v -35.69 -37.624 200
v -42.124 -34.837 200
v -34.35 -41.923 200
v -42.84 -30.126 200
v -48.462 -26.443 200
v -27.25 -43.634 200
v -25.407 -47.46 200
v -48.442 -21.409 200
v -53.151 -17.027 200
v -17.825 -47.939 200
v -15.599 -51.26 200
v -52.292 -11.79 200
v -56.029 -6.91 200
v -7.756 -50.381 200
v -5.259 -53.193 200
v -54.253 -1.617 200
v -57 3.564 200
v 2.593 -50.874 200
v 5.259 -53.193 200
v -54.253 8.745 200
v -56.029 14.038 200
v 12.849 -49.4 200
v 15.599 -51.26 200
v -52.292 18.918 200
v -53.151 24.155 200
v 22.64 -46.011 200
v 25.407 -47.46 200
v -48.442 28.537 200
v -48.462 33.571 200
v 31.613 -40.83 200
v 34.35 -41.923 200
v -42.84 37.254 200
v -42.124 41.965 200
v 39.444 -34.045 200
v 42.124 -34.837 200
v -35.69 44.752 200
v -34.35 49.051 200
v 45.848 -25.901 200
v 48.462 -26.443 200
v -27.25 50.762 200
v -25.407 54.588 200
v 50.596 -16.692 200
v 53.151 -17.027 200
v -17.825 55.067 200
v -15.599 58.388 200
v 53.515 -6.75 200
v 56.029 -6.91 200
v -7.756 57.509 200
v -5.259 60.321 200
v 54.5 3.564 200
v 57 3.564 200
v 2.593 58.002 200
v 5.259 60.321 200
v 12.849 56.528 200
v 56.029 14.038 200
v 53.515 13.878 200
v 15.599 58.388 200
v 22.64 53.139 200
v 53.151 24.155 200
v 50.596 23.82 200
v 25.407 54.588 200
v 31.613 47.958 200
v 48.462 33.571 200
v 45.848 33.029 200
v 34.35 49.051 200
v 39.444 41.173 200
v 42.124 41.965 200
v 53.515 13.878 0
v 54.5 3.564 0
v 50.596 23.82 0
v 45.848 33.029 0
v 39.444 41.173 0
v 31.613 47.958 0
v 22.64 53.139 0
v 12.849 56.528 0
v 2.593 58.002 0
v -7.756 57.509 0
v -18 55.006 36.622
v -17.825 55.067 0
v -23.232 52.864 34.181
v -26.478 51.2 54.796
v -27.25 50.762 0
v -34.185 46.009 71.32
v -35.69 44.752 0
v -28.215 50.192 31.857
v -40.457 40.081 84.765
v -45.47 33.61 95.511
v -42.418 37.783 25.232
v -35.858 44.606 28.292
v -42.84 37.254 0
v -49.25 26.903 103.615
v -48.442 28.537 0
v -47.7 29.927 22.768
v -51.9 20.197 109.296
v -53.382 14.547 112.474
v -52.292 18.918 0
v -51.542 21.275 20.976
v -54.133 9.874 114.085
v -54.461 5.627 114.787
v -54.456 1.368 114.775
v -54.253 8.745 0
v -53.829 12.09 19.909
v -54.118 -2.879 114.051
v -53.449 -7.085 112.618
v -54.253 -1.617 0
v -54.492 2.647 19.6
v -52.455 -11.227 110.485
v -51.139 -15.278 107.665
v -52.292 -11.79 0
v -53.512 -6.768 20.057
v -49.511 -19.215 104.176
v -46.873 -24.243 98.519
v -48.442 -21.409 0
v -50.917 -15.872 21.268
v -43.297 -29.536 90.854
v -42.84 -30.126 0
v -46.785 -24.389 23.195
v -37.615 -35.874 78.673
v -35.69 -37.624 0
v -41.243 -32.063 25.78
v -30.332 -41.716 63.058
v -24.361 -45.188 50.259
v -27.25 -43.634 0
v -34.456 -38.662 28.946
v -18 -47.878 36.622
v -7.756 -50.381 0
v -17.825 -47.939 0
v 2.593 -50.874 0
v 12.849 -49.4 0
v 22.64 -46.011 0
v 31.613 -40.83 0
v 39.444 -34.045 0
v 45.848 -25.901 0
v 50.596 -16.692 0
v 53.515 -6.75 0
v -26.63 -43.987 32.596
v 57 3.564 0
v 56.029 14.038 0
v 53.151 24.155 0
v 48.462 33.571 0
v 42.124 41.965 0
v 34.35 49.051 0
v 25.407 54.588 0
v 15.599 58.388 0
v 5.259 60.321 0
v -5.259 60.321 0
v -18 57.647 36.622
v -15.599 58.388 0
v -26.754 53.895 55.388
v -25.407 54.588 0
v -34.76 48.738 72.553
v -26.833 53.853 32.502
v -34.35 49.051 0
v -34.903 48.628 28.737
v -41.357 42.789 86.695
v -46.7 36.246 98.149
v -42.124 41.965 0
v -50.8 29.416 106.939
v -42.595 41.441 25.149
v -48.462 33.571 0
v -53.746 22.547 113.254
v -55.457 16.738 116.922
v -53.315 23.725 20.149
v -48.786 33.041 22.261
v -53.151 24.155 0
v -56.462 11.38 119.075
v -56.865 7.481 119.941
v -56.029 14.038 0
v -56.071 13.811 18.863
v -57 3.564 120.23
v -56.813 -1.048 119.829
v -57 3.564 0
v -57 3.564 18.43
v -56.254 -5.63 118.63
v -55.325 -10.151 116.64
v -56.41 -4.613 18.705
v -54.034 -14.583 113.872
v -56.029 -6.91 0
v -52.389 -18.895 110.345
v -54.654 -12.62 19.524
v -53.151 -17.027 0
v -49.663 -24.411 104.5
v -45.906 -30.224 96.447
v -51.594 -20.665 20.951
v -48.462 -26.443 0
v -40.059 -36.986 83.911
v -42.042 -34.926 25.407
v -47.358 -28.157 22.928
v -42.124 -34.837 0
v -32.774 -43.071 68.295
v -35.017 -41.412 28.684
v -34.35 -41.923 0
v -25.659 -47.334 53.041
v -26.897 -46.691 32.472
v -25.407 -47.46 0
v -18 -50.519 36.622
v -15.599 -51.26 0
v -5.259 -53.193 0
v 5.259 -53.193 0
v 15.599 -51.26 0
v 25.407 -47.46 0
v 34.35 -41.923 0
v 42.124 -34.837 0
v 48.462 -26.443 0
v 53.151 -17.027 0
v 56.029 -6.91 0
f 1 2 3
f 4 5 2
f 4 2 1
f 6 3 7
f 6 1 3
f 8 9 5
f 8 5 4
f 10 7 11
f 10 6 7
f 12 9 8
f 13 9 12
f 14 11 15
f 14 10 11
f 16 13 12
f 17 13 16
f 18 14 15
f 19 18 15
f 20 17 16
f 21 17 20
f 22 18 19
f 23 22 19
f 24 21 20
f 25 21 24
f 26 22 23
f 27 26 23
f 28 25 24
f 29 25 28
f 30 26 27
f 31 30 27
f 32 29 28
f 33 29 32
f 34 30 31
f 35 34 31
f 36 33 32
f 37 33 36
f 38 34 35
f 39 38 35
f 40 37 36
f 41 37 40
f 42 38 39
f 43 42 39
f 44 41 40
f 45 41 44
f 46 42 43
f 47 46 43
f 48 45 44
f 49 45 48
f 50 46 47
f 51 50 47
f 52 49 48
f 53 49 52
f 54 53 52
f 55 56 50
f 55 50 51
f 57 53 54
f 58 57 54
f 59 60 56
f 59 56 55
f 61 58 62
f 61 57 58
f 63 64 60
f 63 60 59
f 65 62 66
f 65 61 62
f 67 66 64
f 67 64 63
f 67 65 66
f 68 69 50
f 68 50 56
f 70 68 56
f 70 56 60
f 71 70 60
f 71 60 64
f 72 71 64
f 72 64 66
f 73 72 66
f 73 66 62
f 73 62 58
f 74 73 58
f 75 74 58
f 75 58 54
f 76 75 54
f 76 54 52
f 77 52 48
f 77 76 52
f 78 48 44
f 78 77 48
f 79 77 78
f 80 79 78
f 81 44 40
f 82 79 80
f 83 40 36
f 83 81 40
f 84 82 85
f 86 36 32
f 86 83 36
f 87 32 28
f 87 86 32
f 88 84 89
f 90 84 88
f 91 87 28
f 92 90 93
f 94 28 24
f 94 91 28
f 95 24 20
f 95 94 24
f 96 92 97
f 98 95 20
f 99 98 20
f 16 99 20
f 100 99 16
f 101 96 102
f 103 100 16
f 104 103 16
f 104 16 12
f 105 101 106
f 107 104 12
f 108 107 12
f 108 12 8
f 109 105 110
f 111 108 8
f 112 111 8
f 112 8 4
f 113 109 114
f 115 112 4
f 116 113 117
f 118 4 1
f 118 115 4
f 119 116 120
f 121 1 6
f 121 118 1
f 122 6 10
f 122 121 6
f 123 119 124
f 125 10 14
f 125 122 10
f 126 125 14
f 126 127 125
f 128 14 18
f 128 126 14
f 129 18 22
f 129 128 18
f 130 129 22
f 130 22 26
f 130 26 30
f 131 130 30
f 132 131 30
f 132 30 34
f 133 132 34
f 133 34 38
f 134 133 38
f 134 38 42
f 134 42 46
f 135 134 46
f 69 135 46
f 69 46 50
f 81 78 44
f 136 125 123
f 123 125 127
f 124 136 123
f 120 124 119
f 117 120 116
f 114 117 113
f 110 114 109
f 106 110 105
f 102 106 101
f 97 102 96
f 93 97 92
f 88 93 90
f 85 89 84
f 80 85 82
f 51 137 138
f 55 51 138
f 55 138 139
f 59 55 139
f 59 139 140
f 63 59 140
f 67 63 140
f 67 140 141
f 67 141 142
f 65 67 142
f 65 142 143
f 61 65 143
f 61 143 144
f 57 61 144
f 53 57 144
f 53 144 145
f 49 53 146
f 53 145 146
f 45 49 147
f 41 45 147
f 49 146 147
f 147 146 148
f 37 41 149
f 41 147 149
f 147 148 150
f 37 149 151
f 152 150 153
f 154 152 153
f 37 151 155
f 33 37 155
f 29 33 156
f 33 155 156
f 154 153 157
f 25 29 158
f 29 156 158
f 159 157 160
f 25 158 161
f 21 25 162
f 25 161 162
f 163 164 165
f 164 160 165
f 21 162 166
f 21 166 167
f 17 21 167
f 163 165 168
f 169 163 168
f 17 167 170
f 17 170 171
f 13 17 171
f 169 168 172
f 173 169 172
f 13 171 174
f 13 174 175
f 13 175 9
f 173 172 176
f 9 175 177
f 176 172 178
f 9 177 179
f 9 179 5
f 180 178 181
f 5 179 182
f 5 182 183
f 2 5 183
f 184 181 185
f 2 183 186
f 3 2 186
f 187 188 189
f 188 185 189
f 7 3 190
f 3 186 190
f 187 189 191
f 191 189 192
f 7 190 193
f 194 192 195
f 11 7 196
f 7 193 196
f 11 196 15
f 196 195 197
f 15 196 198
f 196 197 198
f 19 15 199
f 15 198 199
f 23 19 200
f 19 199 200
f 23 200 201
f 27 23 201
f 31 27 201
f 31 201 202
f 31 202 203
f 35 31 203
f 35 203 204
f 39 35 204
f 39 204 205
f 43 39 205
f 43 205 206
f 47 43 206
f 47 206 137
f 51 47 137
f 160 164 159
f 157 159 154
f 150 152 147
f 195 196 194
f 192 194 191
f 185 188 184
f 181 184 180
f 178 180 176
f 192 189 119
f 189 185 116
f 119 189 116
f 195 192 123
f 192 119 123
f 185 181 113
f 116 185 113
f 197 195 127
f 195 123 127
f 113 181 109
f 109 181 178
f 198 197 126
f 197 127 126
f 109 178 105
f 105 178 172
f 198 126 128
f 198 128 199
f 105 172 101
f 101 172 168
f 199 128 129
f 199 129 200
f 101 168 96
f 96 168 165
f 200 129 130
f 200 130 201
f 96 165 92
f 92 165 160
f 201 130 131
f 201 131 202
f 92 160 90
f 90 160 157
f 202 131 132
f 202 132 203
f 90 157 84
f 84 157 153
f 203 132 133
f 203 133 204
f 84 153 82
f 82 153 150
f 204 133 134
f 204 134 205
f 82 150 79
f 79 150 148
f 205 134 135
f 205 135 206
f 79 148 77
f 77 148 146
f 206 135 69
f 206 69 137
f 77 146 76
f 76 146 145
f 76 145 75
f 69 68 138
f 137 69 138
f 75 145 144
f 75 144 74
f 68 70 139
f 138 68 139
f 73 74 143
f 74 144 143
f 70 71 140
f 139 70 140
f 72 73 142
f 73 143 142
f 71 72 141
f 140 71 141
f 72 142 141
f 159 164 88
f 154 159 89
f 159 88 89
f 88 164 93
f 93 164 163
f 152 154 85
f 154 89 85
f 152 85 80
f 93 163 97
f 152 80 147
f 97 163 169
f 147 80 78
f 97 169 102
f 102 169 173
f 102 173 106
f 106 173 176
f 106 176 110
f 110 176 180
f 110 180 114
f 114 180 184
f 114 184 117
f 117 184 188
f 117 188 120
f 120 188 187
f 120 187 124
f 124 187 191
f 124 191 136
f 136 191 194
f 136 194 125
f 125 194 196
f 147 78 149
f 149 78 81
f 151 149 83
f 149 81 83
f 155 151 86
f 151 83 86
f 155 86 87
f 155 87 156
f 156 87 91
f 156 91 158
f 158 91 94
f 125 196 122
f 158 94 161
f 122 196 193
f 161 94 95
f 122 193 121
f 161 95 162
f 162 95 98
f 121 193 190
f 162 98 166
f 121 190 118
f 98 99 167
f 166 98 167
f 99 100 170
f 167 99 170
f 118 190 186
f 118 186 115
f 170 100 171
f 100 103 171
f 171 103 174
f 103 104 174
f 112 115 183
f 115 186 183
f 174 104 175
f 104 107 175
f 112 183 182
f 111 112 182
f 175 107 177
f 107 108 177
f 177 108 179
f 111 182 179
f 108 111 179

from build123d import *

# Parameters (mm, degrees)
F0_R     = 57
F1_DEPTH = 200
F2_T     = -2.5
F4_DEPTH = 60


with BuildPart() as f1:
    # F0 (on Top) → F1 (new body)
    with BuildSketch(Plane.XY):
        with Locations((0, 3.563962)):
            Circle(F0_R)
    extrude(amount=F1_DEPTH)

    # F2
    f2_openings = [f1.faces().sort_by_distance(p)[0] for p in [
        (0, 3.563962, 0),
        (0, 3.563962, 200),
    ]]
    offset(amount=F2_T, openings=f2_openings)

    # F3 (on Front) → F4 (cut, symmetric)
    with BuildSketch(Plane.XZ):
        Polygon((-57, 120.229874), (-57, 18.429874), (-18, 36.621924), align=None)
    extrude(amount=F4_DEPTH, both=True, mode=Mode.SUBTRACT)


solid = f1.part
